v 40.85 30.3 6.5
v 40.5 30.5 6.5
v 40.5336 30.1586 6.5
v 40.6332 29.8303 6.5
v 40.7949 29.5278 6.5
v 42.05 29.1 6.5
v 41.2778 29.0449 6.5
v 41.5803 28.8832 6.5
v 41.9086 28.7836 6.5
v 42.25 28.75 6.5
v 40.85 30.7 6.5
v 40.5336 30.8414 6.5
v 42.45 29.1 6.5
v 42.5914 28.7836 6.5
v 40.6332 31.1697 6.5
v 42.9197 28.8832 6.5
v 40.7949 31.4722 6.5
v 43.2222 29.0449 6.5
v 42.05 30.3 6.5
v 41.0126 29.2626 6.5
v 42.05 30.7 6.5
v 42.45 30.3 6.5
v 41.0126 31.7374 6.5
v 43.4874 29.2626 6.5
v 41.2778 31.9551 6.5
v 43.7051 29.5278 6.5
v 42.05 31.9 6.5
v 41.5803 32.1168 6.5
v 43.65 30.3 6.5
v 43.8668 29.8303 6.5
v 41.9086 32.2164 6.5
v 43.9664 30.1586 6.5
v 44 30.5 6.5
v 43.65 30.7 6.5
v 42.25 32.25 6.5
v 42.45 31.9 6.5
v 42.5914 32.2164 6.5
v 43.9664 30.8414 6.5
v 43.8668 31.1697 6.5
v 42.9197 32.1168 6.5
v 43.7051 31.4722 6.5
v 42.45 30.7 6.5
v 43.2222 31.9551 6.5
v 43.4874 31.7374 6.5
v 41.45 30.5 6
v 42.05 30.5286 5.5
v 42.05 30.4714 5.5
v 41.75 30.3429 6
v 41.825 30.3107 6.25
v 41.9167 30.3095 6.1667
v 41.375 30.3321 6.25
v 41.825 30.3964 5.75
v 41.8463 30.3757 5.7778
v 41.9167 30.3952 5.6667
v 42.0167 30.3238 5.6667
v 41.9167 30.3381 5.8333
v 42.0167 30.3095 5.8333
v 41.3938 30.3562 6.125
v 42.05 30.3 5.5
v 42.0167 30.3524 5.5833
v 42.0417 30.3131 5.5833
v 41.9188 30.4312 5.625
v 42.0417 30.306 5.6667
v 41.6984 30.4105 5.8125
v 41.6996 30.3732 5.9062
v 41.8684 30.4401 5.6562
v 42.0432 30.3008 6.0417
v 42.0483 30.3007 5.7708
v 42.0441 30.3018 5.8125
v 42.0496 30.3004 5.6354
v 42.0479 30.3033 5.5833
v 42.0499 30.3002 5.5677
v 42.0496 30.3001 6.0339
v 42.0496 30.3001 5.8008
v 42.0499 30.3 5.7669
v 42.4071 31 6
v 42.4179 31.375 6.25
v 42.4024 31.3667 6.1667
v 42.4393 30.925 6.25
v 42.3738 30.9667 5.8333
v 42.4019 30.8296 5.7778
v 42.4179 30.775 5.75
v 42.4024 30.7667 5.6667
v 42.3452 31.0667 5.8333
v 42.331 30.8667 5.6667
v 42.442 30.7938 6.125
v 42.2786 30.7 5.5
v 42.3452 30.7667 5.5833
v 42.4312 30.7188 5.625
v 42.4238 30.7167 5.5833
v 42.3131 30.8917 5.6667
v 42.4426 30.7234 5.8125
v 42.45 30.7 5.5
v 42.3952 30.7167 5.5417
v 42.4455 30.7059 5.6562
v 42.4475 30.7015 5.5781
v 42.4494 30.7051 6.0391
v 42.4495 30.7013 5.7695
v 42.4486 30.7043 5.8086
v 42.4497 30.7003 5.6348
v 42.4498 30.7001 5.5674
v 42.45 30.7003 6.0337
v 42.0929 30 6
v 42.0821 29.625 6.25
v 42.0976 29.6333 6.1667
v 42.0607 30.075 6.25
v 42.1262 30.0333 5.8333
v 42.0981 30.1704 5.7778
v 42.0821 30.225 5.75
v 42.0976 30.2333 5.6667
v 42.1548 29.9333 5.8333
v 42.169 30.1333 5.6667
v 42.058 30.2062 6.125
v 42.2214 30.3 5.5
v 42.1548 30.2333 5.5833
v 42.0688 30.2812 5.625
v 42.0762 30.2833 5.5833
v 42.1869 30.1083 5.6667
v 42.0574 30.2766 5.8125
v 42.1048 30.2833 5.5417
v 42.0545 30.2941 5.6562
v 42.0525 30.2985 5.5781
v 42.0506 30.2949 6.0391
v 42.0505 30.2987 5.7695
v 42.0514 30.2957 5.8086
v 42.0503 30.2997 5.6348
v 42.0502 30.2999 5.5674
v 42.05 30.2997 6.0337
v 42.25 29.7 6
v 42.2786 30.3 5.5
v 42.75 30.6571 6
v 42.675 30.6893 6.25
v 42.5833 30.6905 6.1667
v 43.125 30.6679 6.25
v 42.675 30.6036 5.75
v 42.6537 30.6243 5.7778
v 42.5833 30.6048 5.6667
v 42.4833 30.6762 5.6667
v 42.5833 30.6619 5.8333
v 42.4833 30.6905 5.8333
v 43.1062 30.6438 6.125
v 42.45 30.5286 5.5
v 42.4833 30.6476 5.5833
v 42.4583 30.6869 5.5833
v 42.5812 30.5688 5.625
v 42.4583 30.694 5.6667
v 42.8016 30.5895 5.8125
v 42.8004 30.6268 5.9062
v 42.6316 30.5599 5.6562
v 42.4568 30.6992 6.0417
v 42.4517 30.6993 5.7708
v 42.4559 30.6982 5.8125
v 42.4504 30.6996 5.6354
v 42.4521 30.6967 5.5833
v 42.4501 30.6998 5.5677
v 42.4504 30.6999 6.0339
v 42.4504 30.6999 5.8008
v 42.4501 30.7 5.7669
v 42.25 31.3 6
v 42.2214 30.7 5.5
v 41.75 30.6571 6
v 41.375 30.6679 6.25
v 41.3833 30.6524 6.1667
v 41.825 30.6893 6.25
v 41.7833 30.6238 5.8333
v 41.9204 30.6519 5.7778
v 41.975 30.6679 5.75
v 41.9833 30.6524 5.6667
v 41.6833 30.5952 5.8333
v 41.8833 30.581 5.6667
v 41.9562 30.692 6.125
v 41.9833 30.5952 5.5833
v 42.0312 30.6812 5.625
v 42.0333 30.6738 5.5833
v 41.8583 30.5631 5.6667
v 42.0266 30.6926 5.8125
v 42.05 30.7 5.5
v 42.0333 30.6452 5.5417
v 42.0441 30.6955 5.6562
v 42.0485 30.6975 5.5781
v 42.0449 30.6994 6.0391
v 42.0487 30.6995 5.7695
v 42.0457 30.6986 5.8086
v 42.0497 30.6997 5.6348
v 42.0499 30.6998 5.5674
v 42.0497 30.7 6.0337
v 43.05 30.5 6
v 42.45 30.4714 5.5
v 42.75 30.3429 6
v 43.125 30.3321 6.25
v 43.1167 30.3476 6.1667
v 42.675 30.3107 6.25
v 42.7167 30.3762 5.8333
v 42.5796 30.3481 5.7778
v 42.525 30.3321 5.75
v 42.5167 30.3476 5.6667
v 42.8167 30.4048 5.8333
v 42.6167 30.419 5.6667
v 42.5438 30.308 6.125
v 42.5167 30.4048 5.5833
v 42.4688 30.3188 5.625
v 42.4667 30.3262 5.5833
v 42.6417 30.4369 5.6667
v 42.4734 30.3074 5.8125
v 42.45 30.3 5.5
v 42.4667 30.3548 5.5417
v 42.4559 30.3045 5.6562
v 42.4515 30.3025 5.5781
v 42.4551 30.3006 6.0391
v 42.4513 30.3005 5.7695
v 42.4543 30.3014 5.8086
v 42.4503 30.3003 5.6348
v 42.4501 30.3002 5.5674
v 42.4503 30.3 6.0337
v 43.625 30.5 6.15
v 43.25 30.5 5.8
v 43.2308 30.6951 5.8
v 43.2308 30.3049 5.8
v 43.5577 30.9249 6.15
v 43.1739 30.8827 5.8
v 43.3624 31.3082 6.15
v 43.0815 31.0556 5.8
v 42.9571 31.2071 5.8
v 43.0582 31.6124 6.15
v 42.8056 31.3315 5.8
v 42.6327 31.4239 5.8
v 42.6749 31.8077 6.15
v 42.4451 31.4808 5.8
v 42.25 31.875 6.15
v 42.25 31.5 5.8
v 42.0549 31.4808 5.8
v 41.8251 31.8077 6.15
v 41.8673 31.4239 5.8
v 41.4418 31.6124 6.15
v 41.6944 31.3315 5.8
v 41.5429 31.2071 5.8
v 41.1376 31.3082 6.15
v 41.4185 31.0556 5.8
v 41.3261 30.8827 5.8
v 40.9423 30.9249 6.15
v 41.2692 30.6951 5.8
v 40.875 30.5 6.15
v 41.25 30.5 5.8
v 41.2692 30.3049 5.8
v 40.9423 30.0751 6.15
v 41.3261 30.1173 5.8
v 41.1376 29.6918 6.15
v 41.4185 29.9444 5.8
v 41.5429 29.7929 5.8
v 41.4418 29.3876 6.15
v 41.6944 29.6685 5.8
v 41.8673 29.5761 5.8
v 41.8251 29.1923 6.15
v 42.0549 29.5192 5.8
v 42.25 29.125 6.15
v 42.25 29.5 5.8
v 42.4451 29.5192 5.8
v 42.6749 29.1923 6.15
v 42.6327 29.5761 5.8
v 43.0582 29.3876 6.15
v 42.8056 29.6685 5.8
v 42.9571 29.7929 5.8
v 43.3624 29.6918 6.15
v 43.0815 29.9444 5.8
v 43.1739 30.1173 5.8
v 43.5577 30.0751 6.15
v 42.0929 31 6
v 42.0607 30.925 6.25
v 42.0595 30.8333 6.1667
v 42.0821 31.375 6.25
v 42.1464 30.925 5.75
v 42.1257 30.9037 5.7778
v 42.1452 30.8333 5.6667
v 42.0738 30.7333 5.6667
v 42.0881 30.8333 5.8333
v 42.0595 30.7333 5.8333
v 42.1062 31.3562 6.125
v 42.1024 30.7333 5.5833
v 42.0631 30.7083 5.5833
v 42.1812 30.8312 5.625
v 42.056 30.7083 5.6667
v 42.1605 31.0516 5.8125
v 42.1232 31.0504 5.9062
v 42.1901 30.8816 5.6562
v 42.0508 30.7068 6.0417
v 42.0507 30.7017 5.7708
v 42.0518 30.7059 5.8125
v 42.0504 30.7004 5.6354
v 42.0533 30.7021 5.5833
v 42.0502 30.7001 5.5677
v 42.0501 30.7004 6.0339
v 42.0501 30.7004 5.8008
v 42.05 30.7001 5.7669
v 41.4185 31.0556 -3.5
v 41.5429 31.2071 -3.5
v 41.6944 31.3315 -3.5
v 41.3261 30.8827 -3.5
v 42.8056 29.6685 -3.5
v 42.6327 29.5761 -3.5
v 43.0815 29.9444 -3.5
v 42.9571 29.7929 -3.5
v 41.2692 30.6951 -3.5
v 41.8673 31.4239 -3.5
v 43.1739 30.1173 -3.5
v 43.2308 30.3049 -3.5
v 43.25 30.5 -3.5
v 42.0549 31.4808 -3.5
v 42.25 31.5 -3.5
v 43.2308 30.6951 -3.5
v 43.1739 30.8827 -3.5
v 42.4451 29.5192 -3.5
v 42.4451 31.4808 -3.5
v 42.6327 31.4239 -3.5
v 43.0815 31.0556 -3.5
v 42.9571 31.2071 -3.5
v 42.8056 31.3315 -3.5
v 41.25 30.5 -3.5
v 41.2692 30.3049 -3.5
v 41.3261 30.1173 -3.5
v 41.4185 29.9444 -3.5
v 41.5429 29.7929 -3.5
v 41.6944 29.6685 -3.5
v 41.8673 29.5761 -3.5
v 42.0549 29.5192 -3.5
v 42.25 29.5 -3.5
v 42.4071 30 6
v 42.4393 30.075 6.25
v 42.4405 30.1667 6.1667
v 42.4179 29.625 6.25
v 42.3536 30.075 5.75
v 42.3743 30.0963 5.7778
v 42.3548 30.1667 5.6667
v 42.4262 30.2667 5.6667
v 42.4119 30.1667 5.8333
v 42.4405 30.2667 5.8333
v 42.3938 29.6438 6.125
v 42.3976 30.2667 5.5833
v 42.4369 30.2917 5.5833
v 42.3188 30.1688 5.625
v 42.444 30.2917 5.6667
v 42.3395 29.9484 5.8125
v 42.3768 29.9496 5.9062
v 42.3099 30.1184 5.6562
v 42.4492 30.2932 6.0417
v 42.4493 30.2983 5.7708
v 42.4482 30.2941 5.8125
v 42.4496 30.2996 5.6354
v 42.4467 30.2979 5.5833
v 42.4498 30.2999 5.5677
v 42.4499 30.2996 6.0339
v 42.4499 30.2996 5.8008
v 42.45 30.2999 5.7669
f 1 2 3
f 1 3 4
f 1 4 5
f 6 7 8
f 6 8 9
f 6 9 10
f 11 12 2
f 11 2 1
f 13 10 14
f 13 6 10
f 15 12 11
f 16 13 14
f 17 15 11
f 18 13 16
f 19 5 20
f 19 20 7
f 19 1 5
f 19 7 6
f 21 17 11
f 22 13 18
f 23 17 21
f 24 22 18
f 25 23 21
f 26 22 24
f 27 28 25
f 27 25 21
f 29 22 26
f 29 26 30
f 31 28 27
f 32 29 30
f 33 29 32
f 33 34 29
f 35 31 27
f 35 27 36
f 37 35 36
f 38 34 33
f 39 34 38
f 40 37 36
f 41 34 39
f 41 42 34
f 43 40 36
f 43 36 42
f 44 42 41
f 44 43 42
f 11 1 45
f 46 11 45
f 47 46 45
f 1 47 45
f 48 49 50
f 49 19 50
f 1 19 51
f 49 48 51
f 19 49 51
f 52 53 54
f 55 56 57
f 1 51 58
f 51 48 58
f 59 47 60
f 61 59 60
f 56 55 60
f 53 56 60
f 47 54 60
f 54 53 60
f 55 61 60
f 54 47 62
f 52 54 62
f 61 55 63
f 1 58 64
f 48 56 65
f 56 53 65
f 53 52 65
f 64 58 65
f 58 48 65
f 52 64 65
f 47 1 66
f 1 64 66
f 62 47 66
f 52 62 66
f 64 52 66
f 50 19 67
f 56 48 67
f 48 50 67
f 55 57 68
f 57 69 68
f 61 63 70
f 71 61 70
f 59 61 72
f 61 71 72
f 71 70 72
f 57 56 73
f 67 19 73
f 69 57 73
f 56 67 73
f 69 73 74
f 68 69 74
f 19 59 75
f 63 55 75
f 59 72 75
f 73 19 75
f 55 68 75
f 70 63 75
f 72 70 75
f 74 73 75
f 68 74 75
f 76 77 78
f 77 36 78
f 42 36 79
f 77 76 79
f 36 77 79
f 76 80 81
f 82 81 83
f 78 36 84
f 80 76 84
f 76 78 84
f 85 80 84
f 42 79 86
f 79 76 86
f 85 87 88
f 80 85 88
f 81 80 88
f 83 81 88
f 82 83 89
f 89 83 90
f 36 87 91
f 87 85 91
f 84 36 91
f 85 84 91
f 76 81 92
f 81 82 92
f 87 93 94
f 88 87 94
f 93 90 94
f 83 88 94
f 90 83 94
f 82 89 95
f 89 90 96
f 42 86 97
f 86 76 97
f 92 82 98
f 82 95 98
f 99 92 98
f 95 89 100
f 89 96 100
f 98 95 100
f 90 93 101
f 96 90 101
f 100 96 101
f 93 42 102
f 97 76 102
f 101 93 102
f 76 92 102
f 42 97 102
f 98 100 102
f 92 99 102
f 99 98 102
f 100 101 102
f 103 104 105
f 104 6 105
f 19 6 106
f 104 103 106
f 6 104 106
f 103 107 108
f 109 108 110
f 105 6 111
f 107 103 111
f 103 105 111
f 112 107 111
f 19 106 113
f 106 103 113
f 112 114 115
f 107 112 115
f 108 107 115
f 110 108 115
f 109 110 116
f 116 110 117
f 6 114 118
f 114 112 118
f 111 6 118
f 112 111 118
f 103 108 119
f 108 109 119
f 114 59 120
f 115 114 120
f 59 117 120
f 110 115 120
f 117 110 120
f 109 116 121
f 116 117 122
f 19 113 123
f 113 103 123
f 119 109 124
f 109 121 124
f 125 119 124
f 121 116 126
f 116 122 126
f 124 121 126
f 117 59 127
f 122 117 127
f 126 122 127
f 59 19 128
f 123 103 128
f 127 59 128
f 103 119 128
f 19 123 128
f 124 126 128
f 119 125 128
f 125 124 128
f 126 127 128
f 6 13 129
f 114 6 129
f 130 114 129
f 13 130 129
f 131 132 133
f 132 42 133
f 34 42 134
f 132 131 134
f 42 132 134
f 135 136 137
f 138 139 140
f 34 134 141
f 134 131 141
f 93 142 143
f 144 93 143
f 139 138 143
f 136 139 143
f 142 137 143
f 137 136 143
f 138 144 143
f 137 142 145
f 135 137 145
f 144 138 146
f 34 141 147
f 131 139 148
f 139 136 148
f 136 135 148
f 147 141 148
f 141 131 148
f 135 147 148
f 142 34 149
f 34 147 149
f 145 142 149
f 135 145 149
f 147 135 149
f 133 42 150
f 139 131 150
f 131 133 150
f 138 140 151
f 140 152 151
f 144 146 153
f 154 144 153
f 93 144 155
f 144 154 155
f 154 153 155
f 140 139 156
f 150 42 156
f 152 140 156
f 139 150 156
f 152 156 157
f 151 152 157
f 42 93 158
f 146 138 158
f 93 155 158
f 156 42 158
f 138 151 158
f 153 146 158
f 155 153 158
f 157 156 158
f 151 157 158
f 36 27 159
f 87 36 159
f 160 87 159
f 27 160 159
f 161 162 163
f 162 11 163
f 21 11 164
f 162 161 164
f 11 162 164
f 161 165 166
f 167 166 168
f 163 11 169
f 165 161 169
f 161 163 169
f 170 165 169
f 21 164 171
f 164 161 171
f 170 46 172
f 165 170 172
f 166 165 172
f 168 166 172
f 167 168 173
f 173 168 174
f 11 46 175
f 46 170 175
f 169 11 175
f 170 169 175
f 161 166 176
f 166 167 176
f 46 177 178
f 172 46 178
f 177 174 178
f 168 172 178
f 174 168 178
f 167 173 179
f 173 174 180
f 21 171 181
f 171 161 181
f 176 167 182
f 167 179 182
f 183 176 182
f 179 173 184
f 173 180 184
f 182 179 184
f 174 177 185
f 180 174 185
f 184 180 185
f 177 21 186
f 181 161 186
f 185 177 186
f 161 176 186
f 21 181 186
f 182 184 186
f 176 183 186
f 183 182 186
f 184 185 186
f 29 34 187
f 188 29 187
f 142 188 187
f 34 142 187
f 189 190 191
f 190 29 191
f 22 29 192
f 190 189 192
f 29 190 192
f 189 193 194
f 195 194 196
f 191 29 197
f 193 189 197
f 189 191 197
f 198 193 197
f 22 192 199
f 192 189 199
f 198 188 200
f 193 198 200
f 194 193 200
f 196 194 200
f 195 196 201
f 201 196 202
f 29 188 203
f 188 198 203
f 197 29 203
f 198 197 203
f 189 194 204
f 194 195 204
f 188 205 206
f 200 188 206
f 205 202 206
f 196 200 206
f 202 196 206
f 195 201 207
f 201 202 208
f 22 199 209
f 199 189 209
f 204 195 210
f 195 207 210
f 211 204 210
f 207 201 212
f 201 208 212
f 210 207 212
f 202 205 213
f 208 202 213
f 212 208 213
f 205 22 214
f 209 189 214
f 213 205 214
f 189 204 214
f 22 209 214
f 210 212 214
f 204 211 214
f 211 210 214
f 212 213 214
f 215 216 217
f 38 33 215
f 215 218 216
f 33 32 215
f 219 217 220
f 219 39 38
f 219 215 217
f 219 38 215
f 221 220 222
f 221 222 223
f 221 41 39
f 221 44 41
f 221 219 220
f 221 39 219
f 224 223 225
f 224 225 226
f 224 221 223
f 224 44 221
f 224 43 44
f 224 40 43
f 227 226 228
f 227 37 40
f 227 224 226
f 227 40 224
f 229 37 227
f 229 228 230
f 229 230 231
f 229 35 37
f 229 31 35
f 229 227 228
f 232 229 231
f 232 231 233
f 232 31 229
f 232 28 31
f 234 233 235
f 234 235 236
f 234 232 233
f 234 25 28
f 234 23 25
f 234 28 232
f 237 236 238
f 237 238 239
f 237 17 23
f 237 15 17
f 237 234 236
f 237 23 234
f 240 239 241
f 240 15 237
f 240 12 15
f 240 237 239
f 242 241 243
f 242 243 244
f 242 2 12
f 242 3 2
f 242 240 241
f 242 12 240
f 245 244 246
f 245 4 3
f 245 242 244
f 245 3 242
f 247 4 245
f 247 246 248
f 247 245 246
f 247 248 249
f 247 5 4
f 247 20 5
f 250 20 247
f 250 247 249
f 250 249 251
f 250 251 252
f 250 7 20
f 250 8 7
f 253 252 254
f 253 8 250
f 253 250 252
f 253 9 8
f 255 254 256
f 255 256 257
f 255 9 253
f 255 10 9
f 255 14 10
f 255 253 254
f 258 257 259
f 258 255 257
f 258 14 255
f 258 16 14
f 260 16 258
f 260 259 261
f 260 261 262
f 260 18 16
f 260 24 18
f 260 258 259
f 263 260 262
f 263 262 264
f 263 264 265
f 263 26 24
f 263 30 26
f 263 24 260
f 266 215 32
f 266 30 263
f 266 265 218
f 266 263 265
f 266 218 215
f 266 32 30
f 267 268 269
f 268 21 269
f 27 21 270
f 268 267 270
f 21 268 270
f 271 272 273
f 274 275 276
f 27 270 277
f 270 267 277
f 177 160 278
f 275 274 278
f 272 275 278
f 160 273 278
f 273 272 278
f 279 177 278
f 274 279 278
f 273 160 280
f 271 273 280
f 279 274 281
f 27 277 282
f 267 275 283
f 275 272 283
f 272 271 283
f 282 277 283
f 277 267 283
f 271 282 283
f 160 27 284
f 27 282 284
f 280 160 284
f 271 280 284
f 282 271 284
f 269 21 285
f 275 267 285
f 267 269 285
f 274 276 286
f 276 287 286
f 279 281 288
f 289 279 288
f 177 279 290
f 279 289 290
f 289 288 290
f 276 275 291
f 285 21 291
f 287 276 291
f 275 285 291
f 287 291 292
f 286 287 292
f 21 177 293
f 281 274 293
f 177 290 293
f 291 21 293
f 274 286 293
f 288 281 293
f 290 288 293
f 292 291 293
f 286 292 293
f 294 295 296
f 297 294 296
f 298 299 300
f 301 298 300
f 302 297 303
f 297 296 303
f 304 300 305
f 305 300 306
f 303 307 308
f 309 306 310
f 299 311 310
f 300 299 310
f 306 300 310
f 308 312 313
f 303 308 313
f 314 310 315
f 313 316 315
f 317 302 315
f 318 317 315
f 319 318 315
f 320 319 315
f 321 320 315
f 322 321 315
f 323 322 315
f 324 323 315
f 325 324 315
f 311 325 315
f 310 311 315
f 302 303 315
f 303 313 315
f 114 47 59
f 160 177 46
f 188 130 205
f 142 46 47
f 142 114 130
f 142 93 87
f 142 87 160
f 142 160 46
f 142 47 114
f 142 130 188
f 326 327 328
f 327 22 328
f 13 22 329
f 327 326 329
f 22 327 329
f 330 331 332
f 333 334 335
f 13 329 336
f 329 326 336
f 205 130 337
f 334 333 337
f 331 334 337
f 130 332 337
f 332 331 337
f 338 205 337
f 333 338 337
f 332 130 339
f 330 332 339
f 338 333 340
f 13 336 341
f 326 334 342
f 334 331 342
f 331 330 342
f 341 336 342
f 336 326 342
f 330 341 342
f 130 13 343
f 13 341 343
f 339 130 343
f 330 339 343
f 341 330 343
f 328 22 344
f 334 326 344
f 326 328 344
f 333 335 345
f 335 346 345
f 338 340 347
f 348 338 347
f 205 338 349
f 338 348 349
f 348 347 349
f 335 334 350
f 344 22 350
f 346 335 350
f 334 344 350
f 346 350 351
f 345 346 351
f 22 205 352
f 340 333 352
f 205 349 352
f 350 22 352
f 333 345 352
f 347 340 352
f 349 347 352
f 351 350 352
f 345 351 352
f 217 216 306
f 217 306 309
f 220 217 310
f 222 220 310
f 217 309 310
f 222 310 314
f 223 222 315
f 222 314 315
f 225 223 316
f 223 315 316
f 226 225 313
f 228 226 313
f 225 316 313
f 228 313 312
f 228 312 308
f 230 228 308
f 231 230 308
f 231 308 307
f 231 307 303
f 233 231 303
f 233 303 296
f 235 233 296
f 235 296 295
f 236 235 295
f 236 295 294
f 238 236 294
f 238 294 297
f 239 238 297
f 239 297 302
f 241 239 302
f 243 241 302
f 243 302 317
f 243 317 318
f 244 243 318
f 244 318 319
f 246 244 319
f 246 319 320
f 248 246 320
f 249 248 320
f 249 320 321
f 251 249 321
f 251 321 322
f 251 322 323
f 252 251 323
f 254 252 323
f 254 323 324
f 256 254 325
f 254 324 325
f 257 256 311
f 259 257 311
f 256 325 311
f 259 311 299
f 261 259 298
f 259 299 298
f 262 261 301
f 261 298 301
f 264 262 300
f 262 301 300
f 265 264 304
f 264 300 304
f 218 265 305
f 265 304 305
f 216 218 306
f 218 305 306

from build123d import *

# Parameters (mm, degrees)
CYLINDER023_R     = 1
CYLINDER023_DEPTH = 9.5
SKETCH011_W       = 0.4
SKETCH011_H       = 0.4


with BuildPart() as part:
    # Cylinder023 → Cylinder023 (join)
    with BuildSketch(Plane.XY):
        Circle(CYLINDER023_R)
    extrude(amount=CYLINDER023_DEPTH)

    # Cone003 → Cone003 (revolve)
    with BuildSketch(Plane(origin=(0, 0, 9.3), x_dir=(1, 0, 0), z_dir=(0, -1, 0))):
        Polygon((0, 0), (1, 0), (1.75, 0.7), (0, 0.7), align=None)
    revolve(axis=Axis((0, 0, 9.3), (0, 0, 1)))

    # Sketch010 (on Face4 of Cone003) → SubtractiveLoft001 section 0
    with BuildSketch(Plane.XY.offset(10)):
        Polygon((-0.2, 0.2), (-0.2, 1.4), (0.2, 1.4), (0.2, 0.2), (1.4, 0.2), (1.4, -0.2), (0.2, -0.2), (0.2, -1.4), (-0.2, -1.4), (-0.2, -0.2), (-1.4, -0.2), (-1.4, 0.2), align=None)
    # Sketch011 (on Face4 of Cone003) → SubtractiveLoft001 section 1
    with BuildSketch(Plane.XY.offset(9)):
        Rectangle(SKETCH011_W, SKETCH011_H)
    loft(mode=Mode.SUBTRACT)


with BuildPart() as part_1:
    # Body011 placement: moved
    add(part.part.moved(Location((42.25, 30.5, -3.5))))


solid = part_1.part
